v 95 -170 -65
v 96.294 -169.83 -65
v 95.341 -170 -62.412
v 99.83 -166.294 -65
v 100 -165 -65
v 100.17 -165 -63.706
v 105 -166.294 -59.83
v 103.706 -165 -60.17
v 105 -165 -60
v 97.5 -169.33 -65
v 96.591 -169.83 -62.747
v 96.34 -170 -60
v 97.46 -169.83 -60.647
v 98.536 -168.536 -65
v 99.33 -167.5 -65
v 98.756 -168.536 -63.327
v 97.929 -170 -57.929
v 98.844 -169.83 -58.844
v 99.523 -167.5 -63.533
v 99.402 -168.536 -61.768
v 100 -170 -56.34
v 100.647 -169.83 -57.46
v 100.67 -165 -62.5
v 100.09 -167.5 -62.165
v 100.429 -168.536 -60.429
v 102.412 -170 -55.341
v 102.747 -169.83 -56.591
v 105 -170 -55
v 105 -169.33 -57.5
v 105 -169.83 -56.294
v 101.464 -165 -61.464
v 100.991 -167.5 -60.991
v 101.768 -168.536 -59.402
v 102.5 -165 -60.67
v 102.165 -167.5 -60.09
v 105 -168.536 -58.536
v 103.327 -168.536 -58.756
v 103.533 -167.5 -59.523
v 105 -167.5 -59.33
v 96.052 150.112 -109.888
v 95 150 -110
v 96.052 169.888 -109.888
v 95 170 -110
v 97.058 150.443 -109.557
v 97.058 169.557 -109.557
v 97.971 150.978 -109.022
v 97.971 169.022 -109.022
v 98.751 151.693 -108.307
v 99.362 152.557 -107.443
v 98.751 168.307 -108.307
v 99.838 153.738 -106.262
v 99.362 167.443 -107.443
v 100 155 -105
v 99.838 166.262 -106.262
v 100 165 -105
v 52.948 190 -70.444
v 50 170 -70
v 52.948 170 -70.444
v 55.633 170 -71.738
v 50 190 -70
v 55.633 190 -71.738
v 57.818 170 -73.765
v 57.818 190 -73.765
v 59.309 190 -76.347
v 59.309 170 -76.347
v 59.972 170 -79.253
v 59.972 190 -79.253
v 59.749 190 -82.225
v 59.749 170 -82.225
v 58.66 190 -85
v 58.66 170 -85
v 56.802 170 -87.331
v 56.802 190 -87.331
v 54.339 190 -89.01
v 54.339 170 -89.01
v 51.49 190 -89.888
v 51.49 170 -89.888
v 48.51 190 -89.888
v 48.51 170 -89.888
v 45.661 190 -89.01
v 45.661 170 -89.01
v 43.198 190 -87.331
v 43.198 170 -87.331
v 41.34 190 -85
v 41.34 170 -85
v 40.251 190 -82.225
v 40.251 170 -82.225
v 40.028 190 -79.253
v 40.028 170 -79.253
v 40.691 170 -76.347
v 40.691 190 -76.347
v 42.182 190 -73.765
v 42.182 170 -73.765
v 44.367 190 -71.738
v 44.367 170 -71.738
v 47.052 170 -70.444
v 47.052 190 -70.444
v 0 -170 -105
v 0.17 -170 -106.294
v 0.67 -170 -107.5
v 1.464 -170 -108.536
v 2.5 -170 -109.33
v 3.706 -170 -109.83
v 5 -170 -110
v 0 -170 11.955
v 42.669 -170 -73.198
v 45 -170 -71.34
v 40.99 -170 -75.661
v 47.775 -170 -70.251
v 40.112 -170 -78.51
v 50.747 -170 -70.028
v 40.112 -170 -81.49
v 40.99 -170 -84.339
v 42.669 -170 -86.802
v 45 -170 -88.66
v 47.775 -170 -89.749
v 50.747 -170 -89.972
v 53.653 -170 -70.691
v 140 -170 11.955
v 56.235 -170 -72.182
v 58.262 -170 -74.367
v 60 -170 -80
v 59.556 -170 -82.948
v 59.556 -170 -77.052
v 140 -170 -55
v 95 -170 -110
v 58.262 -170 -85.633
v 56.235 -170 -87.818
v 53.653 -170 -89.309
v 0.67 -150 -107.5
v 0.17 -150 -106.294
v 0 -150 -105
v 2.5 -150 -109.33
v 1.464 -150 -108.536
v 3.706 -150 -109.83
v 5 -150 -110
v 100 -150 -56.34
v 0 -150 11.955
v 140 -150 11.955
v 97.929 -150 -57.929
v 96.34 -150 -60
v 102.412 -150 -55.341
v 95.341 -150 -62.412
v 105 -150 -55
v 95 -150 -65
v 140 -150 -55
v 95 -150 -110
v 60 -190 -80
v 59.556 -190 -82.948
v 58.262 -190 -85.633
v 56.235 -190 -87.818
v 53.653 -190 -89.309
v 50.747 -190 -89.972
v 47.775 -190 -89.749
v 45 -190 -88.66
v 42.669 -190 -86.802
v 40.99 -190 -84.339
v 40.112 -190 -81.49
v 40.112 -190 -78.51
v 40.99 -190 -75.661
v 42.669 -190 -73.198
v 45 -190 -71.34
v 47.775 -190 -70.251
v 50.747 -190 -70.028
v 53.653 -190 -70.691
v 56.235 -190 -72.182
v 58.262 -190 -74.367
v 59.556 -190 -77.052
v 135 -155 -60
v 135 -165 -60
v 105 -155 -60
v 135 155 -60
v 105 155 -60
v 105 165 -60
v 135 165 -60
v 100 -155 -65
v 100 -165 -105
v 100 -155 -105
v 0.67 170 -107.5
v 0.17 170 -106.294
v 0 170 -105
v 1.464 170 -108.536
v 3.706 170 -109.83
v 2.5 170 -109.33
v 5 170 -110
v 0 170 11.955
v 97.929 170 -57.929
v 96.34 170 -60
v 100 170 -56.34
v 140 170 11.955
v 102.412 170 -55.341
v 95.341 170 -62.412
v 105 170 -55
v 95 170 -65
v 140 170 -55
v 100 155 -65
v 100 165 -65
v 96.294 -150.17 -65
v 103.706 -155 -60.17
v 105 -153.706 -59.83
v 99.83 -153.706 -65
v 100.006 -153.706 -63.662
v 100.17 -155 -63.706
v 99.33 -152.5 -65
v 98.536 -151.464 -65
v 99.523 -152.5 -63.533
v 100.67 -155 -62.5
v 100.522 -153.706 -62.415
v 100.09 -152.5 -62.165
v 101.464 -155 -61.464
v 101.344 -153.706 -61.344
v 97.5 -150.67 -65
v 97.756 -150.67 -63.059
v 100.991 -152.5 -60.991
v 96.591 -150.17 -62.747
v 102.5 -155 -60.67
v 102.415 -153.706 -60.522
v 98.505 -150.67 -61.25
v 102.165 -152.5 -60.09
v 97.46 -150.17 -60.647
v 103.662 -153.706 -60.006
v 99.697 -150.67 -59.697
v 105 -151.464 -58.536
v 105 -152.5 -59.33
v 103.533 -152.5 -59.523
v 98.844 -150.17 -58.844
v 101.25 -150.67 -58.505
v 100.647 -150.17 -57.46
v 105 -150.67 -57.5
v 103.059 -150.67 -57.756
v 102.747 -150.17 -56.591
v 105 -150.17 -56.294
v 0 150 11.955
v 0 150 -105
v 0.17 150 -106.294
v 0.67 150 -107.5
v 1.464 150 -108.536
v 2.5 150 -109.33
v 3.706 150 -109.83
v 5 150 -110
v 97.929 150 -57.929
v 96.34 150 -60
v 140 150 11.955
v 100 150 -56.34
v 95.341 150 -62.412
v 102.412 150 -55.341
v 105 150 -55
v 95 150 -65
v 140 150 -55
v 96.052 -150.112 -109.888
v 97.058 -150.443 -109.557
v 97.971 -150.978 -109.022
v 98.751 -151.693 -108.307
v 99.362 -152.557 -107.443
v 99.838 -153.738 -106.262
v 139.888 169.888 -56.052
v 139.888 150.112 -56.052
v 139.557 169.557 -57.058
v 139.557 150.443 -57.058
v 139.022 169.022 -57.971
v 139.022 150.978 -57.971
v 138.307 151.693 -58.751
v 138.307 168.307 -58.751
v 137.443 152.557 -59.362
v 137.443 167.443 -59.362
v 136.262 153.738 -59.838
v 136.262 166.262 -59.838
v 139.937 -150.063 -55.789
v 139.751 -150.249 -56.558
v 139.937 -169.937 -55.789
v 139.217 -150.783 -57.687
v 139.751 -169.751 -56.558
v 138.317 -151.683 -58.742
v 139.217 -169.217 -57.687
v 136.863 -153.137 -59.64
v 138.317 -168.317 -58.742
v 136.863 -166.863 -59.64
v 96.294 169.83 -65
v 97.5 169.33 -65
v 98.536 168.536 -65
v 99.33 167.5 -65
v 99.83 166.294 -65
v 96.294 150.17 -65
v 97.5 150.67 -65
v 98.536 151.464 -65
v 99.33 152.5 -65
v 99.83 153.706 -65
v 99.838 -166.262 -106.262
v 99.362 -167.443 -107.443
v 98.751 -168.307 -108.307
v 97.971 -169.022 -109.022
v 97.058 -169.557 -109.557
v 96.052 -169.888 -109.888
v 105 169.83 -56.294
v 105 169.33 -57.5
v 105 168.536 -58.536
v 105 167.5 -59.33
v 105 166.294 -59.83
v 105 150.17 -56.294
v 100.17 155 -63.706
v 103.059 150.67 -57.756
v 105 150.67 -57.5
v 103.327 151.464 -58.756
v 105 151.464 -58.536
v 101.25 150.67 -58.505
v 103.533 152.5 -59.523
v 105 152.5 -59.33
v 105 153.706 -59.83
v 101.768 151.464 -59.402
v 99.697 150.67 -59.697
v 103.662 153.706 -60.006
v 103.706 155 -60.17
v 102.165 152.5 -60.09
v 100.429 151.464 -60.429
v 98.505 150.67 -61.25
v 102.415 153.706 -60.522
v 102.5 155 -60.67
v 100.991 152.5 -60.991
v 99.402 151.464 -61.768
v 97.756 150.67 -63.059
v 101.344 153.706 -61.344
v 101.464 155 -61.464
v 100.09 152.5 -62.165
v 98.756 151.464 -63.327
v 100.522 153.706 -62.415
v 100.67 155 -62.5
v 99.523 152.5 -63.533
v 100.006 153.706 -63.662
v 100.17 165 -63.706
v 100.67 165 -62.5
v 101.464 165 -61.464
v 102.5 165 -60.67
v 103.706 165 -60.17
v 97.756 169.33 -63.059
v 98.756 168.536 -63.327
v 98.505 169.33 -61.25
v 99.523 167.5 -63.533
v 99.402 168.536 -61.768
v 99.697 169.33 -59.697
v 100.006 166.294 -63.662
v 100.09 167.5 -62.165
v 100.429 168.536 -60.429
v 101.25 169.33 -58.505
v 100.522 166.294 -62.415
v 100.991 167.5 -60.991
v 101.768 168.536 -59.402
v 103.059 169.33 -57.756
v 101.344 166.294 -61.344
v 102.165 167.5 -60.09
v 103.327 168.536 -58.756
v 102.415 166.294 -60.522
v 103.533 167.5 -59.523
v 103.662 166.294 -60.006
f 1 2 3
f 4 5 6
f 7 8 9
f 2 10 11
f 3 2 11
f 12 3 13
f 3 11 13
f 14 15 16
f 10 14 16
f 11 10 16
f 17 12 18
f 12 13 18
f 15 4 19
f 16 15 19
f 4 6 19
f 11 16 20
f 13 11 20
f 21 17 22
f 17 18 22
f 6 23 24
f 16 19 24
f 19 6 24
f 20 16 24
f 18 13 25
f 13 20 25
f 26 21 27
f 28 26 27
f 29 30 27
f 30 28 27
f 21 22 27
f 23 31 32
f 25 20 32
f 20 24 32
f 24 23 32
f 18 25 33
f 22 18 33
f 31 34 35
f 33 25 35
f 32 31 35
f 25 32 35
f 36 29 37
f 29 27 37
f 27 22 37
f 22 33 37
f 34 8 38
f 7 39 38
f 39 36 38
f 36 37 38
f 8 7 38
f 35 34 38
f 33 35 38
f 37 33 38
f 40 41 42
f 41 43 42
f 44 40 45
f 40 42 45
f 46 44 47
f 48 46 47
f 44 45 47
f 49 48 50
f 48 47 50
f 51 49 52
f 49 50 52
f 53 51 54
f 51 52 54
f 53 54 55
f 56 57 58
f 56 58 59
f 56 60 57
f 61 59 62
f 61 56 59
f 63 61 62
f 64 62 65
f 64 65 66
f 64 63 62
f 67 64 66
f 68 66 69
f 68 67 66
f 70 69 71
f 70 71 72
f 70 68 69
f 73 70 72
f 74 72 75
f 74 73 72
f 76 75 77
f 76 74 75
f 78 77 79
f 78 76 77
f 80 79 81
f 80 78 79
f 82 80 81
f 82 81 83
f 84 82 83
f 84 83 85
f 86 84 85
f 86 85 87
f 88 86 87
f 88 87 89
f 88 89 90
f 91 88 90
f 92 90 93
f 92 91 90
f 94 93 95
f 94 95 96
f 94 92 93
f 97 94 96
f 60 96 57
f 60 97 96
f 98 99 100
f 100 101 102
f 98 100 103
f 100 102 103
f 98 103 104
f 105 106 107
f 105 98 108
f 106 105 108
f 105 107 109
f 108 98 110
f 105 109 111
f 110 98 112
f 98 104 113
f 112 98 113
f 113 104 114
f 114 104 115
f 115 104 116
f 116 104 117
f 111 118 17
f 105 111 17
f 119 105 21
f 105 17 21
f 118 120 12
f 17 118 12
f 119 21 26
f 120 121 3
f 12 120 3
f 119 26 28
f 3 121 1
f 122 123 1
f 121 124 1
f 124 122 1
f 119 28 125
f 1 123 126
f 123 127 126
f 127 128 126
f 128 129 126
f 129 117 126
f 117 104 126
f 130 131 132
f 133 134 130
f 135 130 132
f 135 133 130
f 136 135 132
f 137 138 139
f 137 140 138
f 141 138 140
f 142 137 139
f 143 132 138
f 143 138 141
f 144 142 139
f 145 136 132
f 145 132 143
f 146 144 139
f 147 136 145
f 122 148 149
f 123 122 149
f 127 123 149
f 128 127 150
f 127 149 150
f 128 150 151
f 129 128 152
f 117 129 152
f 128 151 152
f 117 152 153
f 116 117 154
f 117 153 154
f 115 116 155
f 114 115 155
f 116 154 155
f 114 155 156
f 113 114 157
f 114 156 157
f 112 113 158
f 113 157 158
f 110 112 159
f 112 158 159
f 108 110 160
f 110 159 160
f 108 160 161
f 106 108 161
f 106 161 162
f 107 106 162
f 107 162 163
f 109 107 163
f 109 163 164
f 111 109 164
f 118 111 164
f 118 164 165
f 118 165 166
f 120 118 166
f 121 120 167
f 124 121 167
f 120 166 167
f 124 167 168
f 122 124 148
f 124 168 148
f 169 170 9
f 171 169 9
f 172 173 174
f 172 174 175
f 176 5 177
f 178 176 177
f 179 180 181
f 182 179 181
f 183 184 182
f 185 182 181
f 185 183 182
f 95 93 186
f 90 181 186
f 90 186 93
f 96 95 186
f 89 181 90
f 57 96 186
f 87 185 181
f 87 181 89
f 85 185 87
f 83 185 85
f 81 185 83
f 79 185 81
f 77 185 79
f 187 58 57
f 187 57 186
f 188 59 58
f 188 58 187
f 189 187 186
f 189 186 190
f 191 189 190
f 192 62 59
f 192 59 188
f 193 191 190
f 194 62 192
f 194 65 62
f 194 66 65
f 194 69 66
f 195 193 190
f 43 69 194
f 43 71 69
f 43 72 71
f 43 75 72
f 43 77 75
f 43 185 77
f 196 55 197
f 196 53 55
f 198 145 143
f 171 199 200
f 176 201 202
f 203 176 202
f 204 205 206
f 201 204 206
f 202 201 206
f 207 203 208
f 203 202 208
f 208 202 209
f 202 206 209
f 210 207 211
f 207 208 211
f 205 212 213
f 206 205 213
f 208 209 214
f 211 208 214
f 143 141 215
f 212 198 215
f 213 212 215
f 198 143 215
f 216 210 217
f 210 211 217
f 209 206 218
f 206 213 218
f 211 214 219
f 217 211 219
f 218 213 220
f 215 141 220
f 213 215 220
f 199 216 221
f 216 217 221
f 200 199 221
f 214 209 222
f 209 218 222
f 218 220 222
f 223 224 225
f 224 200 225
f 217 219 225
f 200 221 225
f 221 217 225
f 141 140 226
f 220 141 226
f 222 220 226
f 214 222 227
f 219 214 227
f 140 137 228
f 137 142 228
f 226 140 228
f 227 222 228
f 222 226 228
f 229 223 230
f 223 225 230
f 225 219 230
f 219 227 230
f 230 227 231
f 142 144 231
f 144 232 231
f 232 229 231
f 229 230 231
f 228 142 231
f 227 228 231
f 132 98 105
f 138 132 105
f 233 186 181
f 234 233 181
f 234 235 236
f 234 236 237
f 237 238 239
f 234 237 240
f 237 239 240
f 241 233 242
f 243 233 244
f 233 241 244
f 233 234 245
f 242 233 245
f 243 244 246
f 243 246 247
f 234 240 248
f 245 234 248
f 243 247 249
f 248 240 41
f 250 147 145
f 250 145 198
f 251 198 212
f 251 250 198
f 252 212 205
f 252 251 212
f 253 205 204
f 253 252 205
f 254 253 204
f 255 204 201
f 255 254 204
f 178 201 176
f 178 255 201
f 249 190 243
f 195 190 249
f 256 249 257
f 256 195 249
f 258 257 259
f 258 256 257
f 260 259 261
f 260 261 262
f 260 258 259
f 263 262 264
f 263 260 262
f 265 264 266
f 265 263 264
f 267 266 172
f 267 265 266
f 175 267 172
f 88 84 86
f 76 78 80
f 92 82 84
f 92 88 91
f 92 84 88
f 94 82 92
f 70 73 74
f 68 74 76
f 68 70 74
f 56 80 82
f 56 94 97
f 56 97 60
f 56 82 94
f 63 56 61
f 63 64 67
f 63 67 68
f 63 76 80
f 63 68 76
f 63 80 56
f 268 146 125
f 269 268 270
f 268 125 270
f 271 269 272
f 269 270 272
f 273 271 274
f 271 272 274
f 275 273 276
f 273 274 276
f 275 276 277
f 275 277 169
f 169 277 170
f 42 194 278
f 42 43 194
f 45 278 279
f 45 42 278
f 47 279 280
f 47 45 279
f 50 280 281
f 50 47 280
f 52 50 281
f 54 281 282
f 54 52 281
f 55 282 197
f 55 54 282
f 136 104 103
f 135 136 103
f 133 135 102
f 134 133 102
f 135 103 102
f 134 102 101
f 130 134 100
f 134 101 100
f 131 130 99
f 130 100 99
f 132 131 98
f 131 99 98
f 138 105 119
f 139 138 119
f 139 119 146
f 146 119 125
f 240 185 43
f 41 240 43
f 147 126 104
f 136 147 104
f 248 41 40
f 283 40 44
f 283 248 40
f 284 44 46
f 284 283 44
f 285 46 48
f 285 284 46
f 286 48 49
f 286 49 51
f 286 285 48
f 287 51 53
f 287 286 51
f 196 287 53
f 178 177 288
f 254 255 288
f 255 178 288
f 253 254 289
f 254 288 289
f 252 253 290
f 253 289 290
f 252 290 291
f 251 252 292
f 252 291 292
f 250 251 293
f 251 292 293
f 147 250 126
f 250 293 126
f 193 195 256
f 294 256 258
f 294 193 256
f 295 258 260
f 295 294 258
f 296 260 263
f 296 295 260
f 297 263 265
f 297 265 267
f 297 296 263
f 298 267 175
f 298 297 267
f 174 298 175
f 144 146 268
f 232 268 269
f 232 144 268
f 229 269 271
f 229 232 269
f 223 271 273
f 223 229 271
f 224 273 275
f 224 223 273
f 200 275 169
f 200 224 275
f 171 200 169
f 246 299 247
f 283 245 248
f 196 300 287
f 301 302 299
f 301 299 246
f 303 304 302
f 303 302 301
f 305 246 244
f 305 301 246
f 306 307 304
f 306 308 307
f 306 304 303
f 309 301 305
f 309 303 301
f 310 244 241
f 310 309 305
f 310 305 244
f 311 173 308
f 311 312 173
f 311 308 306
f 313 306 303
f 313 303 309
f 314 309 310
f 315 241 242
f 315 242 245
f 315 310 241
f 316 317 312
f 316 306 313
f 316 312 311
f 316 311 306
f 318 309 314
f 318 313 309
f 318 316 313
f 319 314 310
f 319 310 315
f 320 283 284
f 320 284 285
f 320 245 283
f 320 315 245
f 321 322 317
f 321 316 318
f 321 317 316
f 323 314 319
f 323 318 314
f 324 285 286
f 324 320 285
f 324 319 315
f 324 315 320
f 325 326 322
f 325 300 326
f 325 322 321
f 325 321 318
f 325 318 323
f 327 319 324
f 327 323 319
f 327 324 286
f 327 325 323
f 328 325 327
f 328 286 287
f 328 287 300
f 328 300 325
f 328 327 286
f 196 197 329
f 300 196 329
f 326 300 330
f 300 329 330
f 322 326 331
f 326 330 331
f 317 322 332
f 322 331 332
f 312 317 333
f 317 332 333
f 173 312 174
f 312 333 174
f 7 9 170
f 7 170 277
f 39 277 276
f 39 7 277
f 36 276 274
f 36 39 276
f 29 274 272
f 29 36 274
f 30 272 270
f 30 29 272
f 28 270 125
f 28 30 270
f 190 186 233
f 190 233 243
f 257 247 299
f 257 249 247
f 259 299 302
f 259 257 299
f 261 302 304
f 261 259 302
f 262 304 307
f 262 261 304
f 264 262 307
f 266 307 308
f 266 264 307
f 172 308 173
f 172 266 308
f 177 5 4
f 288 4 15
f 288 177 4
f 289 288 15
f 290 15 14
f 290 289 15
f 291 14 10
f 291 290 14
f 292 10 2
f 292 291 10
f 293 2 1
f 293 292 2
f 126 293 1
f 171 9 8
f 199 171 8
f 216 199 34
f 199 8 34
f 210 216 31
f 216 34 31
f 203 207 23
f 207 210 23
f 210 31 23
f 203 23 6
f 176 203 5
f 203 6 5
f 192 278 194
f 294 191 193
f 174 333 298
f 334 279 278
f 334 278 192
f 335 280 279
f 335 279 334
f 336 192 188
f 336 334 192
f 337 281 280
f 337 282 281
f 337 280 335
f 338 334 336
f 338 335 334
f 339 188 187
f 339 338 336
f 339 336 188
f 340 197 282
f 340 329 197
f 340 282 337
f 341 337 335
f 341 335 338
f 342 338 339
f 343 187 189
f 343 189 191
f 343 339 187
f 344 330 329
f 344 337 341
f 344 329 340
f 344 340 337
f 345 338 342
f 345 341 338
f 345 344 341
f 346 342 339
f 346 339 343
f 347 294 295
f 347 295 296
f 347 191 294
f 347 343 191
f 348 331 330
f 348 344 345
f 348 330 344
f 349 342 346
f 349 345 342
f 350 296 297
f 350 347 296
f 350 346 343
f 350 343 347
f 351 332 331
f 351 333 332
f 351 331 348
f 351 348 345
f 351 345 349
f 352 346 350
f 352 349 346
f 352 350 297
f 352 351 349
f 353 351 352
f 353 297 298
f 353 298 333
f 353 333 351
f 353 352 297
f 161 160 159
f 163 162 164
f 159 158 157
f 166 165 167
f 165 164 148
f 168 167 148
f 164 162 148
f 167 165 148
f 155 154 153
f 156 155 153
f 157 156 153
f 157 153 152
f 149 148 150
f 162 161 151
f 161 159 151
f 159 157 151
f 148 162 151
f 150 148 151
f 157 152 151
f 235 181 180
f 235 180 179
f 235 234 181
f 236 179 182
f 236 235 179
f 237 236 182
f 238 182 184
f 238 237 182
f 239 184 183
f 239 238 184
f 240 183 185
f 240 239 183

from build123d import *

# Parameters (mm, degrees)
SKETCH1_W            = 140
SKETCH1_H            = 121.955
BOSS_EXTRUDE1_DEPTH  = 20
SKETCH2_W            = 40
SKETCH2_H            = 50
CUT_EXTRUDE1_DEPTH   = 180.164728672
SKETCH3_W            = 10
SKETCH3_H            = 20
FILLET1_R            = 5
REVOLVE2_START       = -170
REVOLVE2_DEPTH       = 20
REVOLVE2_START_2     = -190
REVOLVE2_2_OUTLINE_R = 10
REVOLVE2_2_DEPTH     = 20
REVOLVE2_START_3     = 104.9999999
REVOLVE2_4_DEPTH     = 36.0000001
REVOLVE2_START_4     = -111
REVOLVE2_5_DEPTH     = 46


with BuildPart() as part:
    # Sketch1 → Boss-Extrude1 (new body)
    with BuildSketch(Plane(origin=(0, 170, 0), x_dir=(1, 0, 0), z_dir=(0, 1, 0))):
        with Locations((70, 49.0225)):
            Rectangle(SKETCH1_W, SKETCH1_H)
    extrude(amount=-BOSS_EXTRUDE1_DEPTH)

    # Sketch2 → Cut-Extrude1 (cut, through all)
    with BuildSketch(Plane.XZ.offset(-150)):
        with Locations((120, -85)):
            Rectangle(SKETCH2_W, SKETCH2_H)
    extrude(amount=-CUT_EXTRUDE1_DEPTH, mode=Mode.SUBTRACT)

    # Sketch3 → Revolve1 (revolve)
    with BuildSketch(Plane(origin=(0, 0, -80), x_dir=(-1, 0, 0), z_dir=(0, 0, -1)), mode=Mode.PRIVATE) as revolve1_sk:
        with Locations((-55, 180)):
            Rectangle(SKETCH3_W, SKETCH3_H)
    revolve(revolve1_sk.sketch.rotate(Axis((50, 170, -80), (0, 1, 0)), 270), axis=Axis((50, 170, -80), (0, 1, 0)))

    # Fillet1
    fillet1_edges = [part.edges().sort_by_distance(p)[0] for p in [
        (140, 160, -60),
        (100, 170, -85),
        (100, 160, -110),
        (120, 170, -60),
        (100, 160, -60),
        (120, 150, -60),
        (100, 150, -85),
        (0, 160, -110),
    ]]
    fillet(fillet1_edges, radius=FILLET1_R)


with BuildPart() as body_2:
    # Revolve2: read off the stored shape, not the designer's step
    # Revolve2 outline → Revolve2 (new body)
    with BuildSketch(Plane(origin=(0, 0, 0), x_dir=(1, 0, 0), z_dir=(0, 1, 0)).offset(REVOLVE2_START)):
        with BuildLine():
            Line((135, 60), (105, 60))
            ThreePointArc((105, 60), (101.464466094, 61.464466094), (100, 65))
            Line((100, 65), (100, 105))
            ThreePointArc((100, 105), (98.535533906, 108.535533906), (95, 110))
            Line((95, 110), (5, 110))
            ThreePointArc((5, 110), (1.464466094, 108.535533906), (0, 105))
            Line((0, 105), (0, -11.955))
            Line((0, -11.955), (140, -11.955))
            Line((140, -11.955), (140, 55))
            ThreePointArc((140, 55), (138.535533906, 58.535533906), (135, 60))
        make_face()
    extrude(amount=REVOLVE2_DEPTH)

    # Revolve2 2 outline → Revolve2 2 (add)
    with BuildSketch(Plane(origin=(0, 0, 0), x_dir=(1, 0, 0), z_dir=(0, 1, 0)).offset(REVOLVE2_START_2)):
        with Locations((50, 80)):
            Circle(REVOLVE2_2_OUTLINE_R)
    extrude(amount=REVOLVE2_2_DEPTH)

    # Revolve2 3 outline → Revolve2 3 (revolve, cut)
    with BuildSketch(Plane(origin=(105, 0, -65), x_dir=(1, 0, 0), z_dir=(0, 0, 1))):
        with BuildLine():
            ThreePointArc((10, -170), (6.464466094, -168.535533906), (5, -165))
            Line((5, -165), (5, -170))
            Line((5, -170), (10, -170))
        make_face()
        with BuildLine():
            Line((5, -150), (5, -155))
            ThreePointArc((5, -155), (6.464466094, -151.464466094), (10, -150))
            Line((10, -150), (5, -150))
        make_face()
    revolve(axis=Axis((105, 0, -65), (0, 1, 0)), mode=Mode.SUBTRACT)

    # Revolve2 4 outline → Revolve2 4 (cut)
    with BuildSketch(Plane.YZ.offset(REVOLVE2_START_3)):
        with BuildLine():
            ThreePointArc((-150, -55), (-151.464466094, -58.535533906), (-155, -60))
            Line((-155, -60), (-150, -60))
            Line((-150, -60), (-150, -55))
        make_face()
        with BuildLine():
            ThreePointArc((-165, -60), (-168.535533906, -58.535533906), (-170, -55))
            Line((-170, -55), (-170, -60))
            Line((-170, -60), (-165, -60))
        make_face()
    extrude(amount=REVOLVE2_4_DEPTH, mode=Mode.SUBTRACT)

    # Revolve2 5 outline → Revolve2 5 (cut)
    with BuildSketch(Plane.XY.offset(REVOLVE2_START_4)):
        with BuildLine():
            Line((100, -170), (100, -165))
            ThreePointArc((100, -165), (98.535533906, -168.535533906), (95, -170))
            Line((95, -170), (100, -170))
        make_face()
        with BuildLine():
            ThreePointArc((95, -150), (98.535533906, -151.464466094), (100, -155))
            Line((100, -155), (100, -150))
            Line((100, -150), (95, -150))
        make_face()
    extrude(amount=REVOLVE2_5_DEPTH, mode=Mode.SUBTRACT)


solid = Compound([part.part, body_2.part])
